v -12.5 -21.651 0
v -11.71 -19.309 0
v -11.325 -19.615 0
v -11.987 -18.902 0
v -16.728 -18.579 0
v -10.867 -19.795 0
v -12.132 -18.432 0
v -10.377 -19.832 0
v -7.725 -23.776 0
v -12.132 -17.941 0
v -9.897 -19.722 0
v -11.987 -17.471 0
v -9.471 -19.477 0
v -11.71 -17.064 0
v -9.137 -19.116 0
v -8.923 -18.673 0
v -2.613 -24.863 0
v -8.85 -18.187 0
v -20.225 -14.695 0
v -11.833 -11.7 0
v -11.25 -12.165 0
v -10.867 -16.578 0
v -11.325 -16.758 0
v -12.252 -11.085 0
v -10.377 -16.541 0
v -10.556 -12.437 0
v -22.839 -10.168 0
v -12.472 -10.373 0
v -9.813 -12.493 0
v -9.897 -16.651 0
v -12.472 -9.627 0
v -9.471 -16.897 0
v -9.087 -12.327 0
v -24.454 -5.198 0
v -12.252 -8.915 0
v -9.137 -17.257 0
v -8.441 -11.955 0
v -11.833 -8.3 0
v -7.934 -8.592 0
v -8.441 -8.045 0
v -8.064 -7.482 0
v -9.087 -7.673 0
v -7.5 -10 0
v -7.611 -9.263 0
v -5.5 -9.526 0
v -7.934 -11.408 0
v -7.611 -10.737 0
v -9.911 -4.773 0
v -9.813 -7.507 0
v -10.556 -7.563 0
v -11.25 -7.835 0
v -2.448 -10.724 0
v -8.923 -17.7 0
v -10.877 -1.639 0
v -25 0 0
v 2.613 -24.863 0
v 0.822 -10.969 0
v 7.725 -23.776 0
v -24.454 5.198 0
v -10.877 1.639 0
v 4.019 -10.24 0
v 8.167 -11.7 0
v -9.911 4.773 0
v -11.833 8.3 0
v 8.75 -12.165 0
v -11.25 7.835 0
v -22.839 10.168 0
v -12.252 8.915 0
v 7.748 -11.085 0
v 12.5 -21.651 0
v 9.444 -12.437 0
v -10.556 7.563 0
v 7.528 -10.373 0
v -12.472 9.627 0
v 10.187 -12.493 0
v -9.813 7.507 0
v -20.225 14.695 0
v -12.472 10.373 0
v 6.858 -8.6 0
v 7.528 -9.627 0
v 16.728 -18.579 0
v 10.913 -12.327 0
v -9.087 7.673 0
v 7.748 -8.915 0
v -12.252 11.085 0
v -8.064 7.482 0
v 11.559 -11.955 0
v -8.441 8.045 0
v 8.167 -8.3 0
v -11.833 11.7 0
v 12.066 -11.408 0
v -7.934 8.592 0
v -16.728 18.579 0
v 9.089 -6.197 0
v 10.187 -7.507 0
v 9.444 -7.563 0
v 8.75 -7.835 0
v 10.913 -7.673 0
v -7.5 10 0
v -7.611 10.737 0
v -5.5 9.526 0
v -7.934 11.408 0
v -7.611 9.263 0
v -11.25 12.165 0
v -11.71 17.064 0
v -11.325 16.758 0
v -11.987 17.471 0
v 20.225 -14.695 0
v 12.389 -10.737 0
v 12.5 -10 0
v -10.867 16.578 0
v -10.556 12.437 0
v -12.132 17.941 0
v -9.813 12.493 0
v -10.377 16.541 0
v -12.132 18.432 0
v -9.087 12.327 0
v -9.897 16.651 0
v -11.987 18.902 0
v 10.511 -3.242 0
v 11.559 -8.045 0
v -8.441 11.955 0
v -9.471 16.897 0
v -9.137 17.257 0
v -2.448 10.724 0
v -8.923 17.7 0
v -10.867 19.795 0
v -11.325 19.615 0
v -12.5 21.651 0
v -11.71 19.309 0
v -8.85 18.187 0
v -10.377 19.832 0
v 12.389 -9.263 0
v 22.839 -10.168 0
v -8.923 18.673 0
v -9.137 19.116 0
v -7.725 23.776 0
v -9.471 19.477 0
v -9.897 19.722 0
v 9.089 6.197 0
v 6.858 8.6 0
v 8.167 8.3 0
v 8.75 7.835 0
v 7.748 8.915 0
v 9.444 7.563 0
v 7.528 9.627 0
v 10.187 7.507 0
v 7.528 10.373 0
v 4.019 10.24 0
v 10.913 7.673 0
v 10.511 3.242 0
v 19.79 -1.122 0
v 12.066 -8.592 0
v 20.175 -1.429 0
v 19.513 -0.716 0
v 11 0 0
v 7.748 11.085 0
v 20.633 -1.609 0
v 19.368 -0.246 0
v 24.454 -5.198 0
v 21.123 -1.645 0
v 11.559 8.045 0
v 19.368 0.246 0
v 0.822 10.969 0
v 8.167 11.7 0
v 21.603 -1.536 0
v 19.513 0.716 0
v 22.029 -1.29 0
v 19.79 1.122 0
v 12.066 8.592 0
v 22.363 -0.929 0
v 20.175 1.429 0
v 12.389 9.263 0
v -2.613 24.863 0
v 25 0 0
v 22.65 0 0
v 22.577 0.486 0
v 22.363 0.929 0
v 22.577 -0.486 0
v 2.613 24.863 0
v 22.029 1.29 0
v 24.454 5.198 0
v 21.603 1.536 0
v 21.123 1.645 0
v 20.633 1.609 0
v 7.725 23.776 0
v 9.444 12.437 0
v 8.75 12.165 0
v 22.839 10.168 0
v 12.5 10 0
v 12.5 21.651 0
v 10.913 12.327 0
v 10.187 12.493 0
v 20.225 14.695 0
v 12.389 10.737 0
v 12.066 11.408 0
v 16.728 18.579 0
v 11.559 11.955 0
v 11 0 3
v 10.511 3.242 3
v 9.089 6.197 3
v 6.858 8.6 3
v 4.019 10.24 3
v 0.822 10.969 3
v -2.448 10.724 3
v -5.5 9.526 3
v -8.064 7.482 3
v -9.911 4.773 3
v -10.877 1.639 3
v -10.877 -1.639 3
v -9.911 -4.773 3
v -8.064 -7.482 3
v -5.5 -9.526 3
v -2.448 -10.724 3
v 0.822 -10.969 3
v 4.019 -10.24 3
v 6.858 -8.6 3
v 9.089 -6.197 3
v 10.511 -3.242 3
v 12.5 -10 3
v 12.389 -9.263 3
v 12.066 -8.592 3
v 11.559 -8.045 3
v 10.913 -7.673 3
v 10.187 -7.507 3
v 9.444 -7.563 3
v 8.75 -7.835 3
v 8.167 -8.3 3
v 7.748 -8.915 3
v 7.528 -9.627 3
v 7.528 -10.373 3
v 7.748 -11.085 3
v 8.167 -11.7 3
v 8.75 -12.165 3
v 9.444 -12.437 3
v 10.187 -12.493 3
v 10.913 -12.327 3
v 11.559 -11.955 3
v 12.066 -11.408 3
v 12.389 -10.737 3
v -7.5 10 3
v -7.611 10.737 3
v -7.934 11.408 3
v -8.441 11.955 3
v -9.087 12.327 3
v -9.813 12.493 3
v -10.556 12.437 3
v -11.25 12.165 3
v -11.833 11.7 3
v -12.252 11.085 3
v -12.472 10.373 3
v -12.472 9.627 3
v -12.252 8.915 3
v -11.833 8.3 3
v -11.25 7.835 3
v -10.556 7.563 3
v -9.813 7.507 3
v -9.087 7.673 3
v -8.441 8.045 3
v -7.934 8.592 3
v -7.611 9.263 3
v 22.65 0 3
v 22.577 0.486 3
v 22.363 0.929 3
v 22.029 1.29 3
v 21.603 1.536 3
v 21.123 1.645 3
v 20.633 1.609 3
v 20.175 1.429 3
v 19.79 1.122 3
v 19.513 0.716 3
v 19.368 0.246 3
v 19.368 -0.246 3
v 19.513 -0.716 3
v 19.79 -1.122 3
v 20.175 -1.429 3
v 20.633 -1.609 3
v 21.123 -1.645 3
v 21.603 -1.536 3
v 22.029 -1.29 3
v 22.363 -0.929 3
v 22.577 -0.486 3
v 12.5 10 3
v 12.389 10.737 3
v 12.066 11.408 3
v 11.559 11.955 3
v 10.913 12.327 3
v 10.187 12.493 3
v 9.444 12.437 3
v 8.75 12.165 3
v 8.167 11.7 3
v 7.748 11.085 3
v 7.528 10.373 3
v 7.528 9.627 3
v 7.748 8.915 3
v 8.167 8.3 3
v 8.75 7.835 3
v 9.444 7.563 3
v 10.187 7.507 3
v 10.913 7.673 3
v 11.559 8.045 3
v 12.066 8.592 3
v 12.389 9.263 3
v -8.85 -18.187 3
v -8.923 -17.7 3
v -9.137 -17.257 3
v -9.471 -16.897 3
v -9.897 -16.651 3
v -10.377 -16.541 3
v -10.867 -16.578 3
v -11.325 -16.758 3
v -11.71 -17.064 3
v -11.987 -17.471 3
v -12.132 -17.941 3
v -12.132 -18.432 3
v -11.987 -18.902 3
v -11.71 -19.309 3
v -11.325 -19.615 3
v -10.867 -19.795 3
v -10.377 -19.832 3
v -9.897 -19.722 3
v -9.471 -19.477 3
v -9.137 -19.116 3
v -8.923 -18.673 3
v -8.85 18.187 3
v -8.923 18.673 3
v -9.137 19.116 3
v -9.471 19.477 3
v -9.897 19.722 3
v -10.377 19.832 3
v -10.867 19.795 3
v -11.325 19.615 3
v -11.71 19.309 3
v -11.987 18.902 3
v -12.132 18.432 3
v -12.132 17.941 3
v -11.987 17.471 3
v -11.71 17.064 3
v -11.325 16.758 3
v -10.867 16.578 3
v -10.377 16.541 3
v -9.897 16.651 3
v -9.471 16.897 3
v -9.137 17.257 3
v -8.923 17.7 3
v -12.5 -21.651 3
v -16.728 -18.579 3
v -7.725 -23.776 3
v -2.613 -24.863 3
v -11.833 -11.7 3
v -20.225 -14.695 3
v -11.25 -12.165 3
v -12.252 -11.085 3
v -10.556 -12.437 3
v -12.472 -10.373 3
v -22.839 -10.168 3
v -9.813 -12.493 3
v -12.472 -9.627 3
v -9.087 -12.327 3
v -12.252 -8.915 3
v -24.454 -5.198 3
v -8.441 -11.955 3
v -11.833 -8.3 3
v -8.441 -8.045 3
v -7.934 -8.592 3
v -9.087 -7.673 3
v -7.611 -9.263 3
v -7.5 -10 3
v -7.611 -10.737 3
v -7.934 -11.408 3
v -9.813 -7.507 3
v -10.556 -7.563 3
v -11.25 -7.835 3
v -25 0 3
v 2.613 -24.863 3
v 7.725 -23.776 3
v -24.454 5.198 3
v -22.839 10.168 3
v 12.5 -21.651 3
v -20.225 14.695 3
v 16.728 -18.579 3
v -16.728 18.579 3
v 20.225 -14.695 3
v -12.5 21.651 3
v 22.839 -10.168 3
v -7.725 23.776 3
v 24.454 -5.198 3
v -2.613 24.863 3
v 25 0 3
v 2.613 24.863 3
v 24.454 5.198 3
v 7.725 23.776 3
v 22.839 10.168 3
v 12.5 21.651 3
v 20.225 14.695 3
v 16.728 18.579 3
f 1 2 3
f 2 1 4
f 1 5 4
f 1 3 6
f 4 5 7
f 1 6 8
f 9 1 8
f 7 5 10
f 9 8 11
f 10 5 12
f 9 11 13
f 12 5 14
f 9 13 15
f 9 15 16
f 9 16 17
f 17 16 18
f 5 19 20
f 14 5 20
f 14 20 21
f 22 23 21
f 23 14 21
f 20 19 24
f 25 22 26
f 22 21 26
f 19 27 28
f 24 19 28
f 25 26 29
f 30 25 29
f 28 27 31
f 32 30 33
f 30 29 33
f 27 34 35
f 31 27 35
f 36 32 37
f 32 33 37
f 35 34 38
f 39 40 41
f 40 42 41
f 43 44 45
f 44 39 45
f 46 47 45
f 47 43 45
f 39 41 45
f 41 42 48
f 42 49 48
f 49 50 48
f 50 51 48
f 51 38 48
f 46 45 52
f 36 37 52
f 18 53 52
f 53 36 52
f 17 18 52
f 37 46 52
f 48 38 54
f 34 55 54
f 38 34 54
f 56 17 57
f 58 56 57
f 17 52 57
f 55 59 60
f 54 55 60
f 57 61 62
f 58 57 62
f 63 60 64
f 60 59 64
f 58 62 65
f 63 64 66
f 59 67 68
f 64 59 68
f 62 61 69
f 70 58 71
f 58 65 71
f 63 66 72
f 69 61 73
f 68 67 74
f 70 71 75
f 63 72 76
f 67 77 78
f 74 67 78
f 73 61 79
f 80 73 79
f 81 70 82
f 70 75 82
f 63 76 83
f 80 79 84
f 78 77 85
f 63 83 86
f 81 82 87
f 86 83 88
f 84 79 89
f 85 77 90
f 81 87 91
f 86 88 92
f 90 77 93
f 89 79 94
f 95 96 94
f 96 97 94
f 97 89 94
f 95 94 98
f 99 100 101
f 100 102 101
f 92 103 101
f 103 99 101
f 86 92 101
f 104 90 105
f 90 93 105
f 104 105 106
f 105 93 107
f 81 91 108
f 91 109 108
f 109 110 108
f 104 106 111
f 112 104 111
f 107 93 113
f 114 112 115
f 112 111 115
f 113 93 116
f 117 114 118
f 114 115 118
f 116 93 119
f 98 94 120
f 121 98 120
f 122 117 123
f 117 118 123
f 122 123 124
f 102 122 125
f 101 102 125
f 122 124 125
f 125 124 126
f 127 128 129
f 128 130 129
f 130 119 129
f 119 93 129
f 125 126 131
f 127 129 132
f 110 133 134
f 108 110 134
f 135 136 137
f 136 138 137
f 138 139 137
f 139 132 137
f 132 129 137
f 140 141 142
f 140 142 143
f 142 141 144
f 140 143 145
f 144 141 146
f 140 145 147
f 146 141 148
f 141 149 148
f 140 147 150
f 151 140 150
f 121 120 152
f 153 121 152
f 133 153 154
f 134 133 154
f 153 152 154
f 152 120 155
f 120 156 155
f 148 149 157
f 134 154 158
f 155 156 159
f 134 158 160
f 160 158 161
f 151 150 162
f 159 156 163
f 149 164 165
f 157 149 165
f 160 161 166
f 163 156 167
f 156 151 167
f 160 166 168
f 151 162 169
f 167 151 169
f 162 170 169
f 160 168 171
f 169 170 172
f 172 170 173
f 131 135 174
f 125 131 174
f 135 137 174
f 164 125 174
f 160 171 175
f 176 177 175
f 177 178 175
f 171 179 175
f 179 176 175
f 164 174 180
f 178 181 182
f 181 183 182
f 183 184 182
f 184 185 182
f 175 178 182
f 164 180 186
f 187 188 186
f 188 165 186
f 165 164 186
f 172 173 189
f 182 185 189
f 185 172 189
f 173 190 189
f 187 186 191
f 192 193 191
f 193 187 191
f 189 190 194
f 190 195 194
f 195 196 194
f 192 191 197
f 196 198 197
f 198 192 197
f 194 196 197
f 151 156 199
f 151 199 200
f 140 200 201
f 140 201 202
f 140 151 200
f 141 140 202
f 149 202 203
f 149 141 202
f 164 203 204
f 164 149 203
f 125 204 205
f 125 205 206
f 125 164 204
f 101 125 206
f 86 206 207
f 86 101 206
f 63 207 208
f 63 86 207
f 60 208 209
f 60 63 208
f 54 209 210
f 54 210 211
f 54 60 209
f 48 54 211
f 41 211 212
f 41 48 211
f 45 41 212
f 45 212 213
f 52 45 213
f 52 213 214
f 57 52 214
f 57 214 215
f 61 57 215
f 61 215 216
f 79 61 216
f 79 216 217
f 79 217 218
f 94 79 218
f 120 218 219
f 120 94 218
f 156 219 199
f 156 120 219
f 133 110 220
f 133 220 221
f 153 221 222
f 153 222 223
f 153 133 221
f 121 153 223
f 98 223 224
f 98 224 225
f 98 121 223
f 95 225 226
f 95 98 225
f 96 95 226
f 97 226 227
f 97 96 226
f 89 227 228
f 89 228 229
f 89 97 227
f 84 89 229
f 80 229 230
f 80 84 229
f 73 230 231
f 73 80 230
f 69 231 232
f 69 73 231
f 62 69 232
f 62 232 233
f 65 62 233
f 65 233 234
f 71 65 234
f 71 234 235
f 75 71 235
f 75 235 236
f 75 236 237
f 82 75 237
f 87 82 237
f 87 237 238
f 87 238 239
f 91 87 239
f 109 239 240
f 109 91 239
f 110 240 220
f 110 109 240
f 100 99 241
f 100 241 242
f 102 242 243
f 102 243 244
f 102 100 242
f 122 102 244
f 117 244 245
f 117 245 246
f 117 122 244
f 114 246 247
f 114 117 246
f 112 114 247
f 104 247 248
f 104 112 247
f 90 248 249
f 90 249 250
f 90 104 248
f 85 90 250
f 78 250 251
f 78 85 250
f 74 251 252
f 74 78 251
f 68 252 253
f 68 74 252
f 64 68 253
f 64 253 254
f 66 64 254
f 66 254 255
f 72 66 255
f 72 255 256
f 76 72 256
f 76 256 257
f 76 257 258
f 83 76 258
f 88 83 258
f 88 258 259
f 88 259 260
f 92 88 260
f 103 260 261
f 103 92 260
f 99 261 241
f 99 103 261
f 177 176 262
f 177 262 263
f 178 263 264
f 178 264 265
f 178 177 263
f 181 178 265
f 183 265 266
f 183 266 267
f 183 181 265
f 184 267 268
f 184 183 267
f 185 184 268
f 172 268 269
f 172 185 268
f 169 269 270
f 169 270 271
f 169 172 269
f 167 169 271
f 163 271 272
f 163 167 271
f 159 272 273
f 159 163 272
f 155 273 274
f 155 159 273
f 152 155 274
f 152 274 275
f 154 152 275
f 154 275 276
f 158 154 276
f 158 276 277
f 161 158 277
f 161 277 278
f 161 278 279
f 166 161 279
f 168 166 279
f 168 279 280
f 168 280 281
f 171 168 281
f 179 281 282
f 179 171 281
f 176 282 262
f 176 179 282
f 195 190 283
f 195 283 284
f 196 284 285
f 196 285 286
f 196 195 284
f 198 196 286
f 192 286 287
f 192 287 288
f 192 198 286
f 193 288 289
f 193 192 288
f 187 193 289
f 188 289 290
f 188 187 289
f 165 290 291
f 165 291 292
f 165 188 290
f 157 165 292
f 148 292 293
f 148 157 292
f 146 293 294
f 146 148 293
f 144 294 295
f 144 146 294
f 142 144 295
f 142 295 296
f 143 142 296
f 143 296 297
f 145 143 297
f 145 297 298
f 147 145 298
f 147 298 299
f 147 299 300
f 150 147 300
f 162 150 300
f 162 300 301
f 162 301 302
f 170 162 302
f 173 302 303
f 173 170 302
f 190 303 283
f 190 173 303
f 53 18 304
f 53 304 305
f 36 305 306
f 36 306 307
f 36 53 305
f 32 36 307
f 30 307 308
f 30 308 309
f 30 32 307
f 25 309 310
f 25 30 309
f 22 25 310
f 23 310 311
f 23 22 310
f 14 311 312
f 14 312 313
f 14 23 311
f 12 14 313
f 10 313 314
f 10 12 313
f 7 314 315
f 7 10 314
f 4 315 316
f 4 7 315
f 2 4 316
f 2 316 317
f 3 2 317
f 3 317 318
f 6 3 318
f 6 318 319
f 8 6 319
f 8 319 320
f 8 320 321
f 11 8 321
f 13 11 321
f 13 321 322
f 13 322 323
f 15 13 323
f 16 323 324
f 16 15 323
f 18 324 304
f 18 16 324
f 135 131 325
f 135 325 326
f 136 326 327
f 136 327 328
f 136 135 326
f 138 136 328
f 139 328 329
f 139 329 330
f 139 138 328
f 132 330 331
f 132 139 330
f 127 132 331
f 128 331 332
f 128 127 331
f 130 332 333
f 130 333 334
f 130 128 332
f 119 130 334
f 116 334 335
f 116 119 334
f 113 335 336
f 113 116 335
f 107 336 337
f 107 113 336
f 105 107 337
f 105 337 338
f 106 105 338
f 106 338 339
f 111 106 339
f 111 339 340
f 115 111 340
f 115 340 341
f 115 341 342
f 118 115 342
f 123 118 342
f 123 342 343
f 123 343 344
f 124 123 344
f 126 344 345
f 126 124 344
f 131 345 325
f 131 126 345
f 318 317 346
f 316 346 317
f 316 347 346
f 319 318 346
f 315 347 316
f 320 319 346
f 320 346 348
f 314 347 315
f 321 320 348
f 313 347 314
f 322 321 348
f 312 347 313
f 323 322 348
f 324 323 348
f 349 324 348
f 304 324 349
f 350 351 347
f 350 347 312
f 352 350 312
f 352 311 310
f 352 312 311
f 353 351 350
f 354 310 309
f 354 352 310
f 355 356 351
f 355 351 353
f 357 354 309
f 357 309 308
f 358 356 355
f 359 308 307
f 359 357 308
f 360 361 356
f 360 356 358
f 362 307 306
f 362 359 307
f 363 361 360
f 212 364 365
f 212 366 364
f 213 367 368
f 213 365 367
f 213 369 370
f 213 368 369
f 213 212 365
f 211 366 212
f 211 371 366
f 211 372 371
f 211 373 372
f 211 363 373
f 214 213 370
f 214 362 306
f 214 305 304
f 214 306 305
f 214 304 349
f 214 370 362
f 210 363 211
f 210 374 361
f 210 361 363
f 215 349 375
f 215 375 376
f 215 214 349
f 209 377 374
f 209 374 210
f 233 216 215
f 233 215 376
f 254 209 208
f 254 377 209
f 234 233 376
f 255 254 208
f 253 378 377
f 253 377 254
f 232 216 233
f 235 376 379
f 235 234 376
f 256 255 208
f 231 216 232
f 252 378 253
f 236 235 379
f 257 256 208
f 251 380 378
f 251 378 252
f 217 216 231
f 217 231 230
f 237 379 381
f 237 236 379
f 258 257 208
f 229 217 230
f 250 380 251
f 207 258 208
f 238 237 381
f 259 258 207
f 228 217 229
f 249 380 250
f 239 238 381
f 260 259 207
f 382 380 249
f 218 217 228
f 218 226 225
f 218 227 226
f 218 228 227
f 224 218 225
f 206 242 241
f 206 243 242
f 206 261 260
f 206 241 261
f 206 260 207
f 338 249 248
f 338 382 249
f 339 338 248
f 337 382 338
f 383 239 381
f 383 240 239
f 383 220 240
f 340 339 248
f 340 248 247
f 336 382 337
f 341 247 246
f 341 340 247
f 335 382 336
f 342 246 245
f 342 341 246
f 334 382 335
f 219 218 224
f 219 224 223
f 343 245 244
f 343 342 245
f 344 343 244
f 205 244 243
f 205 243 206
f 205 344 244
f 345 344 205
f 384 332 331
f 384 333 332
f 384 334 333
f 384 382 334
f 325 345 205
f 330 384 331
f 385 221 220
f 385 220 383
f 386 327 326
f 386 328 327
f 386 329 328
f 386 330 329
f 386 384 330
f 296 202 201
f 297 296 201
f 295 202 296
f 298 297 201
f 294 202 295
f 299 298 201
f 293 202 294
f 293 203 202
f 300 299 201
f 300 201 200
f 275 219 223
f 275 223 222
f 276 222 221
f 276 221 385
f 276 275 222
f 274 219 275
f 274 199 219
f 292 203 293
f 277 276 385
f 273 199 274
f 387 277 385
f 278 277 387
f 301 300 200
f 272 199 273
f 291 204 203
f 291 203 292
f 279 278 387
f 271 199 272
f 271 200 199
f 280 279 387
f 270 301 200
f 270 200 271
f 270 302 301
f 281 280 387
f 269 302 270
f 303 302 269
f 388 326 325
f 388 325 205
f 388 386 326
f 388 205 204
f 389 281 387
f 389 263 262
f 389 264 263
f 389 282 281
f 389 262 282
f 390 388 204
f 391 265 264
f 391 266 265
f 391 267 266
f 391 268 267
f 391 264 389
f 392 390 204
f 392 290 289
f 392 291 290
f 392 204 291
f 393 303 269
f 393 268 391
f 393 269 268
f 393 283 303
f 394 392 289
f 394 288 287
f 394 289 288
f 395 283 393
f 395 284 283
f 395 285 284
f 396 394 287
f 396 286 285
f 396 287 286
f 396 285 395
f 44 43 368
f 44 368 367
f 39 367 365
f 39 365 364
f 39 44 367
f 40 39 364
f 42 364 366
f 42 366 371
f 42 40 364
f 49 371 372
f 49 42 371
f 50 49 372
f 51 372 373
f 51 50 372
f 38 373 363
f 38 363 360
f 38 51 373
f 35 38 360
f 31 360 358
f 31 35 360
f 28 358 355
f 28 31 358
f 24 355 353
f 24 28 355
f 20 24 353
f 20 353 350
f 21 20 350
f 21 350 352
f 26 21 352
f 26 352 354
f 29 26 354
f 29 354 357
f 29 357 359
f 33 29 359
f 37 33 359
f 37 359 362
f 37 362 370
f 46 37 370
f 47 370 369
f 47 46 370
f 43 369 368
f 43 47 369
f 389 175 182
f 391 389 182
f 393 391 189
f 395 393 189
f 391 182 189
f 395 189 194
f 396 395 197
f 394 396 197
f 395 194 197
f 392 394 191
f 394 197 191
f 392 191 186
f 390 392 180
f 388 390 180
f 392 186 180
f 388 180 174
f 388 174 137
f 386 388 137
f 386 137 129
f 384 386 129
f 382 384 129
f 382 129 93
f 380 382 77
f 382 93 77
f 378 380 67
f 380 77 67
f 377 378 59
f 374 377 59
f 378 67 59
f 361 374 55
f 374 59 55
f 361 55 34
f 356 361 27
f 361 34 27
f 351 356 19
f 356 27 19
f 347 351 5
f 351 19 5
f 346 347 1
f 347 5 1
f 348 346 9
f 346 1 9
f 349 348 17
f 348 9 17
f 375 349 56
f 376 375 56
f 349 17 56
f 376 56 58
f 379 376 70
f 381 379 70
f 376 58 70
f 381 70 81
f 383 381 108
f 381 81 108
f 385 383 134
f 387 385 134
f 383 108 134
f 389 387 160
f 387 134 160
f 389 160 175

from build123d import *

# Parameters (mm, degrees)
SKETCH_1_R      = 25
SKETCH_1_R_2    = 11
SKETCH_1_R_3    = 2.5
SKETCH_1_R_4    = 1.65
EXTRUDE_1_DEPTH = 3


with BuildPart() as part:
    # 草图1 → 凸台-拉伸1 (new body)
    with BuildSketch(Plane.XY):
        Circle(SKETCH_1_R)
        Circle(SKETCH_1_R_2, mode=Mode.SUBTRACT)
        with Locations((10, 10)):
            Circle(SKETCH_1_R_3, mode=Mode.SUBTRACT)
        with Locations((-10, 10)):
            Circle(SKETCH_1_R_3, mode=Mode.SUBTRACT)
        with Locations((10, -10)):
            Circle(SKETCH_1_R_3, mode=Mode.SUBTRACT)
        with Locations((-10, -10)):
            Circle(SKETCH_1_R_3, mode=Mode.SUBTRACT)
        with Locations((21, 0)):
            Circle(SKETCH_1_R_4, mode=Mode.SUBTRACT)
        with Locations((-10.5, 18.186533479)):
            Circle(SKETCH_1_R_4, mode=Mode.SUBTRACT)
        with Locations((-10.5, -18.186533479)):
            Circle(SKETCH_1_R_4, mode=Mode.SUBTRACT)
    extrude(amount=EXTRUDE_1_DEPTH)


solid = part.part
